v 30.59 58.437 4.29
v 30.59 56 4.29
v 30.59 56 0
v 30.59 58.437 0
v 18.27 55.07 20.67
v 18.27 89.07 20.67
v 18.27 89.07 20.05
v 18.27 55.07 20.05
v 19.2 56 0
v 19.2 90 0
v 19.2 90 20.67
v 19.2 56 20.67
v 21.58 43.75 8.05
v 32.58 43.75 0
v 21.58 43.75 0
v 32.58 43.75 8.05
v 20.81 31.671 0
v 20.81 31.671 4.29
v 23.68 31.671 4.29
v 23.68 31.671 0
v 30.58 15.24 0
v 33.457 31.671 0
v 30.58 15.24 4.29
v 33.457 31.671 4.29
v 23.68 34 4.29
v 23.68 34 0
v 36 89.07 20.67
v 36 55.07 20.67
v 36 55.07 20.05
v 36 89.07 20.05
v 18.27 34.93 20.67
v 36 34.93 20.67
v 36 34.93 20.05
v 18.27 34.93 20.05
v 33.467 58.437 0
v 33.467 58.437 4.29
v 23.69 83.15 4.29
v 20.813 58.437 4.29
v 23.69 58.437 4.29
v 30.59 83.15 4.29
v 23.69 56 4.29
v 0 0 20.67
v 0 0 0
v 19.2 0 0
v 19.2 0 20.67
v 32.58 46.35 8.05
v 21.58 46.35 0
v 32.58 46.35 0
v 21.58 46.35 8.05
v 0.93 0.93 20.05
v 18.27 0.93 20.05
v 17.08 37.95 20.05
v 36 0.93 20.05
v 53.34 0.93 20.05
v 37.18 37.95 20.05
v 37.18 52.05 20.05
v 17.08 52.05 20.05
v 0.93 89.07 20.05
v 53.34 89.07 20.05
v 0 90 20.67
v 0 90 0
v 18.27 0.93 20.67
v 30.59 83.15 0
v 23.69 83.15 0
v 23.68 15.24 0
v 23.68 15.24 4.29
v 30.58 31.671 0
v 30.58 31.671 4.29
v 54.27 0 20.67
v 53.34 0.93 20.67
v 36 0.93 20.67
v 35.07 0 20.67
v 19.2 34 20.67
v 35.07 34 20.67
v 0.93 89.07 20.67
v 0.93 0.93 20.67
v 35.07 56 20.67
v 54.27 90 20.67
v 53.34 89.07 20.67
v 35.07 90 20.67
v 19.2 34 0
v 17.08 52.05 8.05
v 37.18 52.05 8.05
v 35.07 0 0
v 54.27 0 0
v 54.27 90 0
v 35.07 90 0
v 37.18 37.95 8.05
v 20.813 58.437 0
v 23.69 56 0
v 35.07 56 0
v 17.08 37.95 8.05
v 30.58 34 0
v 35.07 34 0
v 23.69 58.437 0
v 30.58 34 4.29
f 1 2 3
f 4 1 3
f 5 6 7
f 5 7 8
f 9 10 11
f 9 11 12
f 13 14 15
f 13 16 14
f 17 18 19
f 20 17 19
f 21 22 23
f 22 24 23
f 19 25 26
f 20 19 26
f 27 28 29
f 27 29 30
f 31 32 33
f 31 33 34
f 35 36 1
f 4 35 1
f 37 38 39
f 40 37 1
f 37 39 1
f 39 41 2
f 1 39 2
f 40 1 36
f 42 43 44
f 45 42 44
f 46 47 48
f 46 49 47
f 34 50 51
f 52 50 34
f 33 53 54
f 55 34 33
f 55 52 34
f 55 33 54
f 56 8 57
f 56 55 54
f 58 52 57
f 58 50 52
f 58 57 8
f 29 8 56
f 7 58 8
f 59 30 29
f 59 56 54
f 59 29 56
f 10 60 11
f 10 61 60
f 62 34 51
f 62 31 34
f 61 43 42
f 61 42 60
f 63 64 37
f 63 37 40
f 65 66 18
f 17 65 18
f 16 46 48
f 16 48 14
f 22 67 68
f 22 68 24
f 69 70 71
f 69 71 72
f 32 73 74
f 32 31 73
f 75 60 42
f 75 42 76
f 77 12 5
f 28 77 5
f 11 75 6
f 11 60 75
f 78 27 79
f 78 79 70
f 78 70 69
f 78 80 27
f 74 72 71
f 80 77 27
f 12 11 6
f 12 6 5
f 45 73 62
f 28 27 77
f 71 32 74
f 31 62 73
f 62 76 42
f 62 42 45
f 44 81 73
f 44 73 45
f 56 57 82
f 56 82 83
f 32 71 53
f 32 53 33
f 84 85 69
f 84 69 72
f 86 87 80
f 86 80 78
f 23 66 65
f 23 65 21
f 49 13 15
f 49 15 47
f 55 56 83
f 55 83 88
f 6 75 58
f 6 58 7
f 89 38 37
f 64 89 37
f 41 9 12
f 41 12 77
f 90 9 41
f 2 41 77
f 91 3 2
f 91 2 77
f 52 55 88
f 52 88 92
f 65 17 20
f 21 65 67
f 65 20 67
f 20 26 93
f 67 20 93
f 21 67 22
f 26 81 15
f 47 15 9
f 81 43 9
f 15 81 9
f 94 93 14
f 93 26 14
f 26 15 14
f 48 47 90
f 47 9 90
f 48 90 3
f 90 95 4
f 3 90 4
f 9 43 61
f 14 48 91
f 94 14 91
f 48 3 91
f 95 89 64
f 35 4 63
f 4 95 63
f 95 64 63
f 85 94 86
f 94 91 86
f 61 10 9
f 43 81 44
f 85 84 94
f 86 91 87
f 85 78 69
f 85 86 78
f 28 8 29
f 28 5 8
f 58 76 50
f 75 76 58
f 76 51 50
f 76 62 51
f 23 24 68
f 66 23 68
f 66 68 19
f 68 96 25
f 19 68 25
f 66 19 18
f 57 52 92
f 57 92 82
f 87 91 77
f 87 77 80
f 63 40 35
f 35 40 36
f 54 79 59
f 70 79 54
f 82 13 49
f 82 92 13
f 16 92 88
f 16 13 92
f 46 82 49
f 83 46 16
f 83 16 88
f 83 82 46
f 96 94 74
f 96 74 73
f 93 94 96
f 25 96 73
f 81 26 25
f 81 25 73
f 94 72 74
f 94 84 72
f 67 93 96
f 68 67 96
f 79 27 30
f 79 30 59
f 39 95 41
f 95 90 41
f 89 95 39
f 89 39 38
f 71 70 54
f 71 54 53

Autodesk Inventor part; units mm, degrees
ref_plane "YZ Plane" through (0, 0, 0) normal (1, 0, 0) x (0, 1, 0)
ref_plane "XZ Plane" through (0, 0, 0) normal (0, 1, 0) x (-1, 0, 0)
ref_plane "XY Plane" through (0, 0, 0) normal (0, 0, 1) x (1, 0, 0)
sketch "Sketch1" plane through (0, 0, 0) normal (0, 0, 1) x (1, 0, 0)
  line L0 (0, 0) -> (0, 90)
  line L1 (0, 90) -> (19.2, 90)
  line L2 (19.2, 90) -> (19.2, 56)
  line L3 (19.2, 56) -> (35.07, 56)
  line L4 (35.07, 56) -> (35.07, 90)
  line L5 (35.07, 90) -> (54.27, 90)
  line L6 (54.27, 90) -> (54.27, 0)
  line L7 (54.27, 0) -> (35.07, 0)
  line L8 (35.07, 0) -> (35.07, 34)
  line L9 (35.07, 34) -> (19.2, 34)
  line L10 (19.2, 34) -> (19.2, 0)
  line L11 (0, 0) -> (19.2, 0)
  dimension "d0" = 90
  dimension "d1" = 19.2
  dimension "d2" = 34
  dimension "d3" = 15.87
  dimension "d4" = 19.2
  dimension "d5" = 34
  dimension "d37" = 22
extrude "Extrusion1" add sketch "Sketch1" along normal blind 20.67
sketch "Sketch2" plane through (19.2, 56, 0) normal (0, 1, 0) x (1, 0, 0)
  line L0 (15.87, 0) -> (0, 0) projected
  line L1 (11.39, 0) -> (4.49, 0)
  line L2 (4.49, 0) -> (4.49, -4.29)
  line L3 (4.49, -4.29) -> (11.39, -4.29)
  line L4 (11.39, -4.29) -> (11.39, 0)
  point P0 (-19.2, 0)
  dimension "d8" = 6.9
  dimension "d9" = 4.29
extrude "Extrusion2" add sketch "Sketch2" along normal blind 27.15
sketch "Sketch3" plane through (23.69, 56, 4.29) normal (0, 0, 1) x (1, 0, 0)
  line L0 (6.9, 0) -> (0, 0) projected
  line L1 (0, 27.15) -> (6.9, 27.15) projected
  line L2 (0, 0) -> (0, 27.15) projected
  line L3 (6.9, 27.15) -> (9.7769, 2.4369)
  line L4 (6.9, 27.15) -> (31.78, 27.15) construction
  line L5 (9.7769, 2.4369) -> (6.9, 2.4369)
  line L6 (6.9, 0) -> (6.9, 27.15) projected
  line L7 (0, 2.4369) -> (-2.877, 2.4369)
  line L8 (-2.877, 2.4369) -> (0, 27.15)
  point P0 (-23.69, -56)
  dimension "d12" = 24.88
  dimension "d13" = 83.36
  dimension "d14" = 2.877
extrude "Extrusion3" add sketch "Sketch3" against normal blind 4.29
sketch "Sketch4" plane through (19.2, 34, 0) normal (0, -1, 0) x (1, 0, 0)
  line L0 (0, 0) -> (0, 20.67) projected
  line L1 (0, 0) -> (4.49, 0) projected
  line L2 (4.48, 0) -> (11.38, 0)
  line L3 (11.38, 0) -> (11.38, 4.29)
  line L4 (11.38, 4.29) -> (4.48, 4.29)
  line L5 (4.48, 4.29) -> (4.48, 0)
  point P0 (-19.2, 0)
  dimension "d17" = 6.9
  dimension "d18" = 4.29
  dimension "d19" = 4.48
extrude "Extrusion4" add sketch "Sketch4" along normal blind 18.76
sketch "Sketch5" plane through (23.68, 34, 4.29) normal (0, 0, 1) x (1, 0, 0)
  line L0 (0, 0) -> (6.9, 0) projected
  line L1 (0, 0) -> (0, -18.76) projected
  line L2 (6.9, -18.76) -> (0, -18.76) projected
  line L3 (0, -18.76) -> (-2.87, -2.3288)
  line L4 (-4.48, -34) -> (-4.48, 0) projected
  line L5 (-2.87, -2.3288) -> (0, -2.3288)
  line L6 (6.9, 0) -> (6.9, -18.76) projected
  line L7 (6.9, -2.3288) -> (9.777, -2.3288)
  line L8 (9.777, -2.3288) -> (6.9, -18.76)
  point P0 (-23.68, -34)
  dimension "d22" = 16.68
  dimension "d23" = 1.61
  dimension "d24" = 2.877
extrude "Extrusion5" add sketch "Sketch5" against normal blind 4.29
sketch "Sketch6" plane through (0, 0, 20.67) normal (0, 0, 1) x (1, 0, 0)
  line L0 (0.93, 0.93) -> (0.93, 89.07)
  line L1 (0, 90) -> (19.2, 90) projected
  line L2 (0.93, 89.07) -> (18.27, 89.07)
  line L3 (18.27, 89.07) -> (18.27, 55.07)
  line L4 (18.27, 55.07) -> (36, 55.07)
  line L5 (36, 55.07) -> (36, 89.07)
  line L6 (36, 89.07) -> (53.34, 89.07)
  line L7 (53.34, 89.07) -> (53.34, 0.93)
  line L8 (53.34, 0.93) -> (36, 0.93)
  line L9 (36, 0.93) -> (36, 34.93)
  line L10 (36, 34.93) -> (18.27, 34.93)
  line L11 (18.27, 34.93) -> (18.27, 0.93)
  line L12 (18.27, 0.93) -> (0.93, 0.93)
  line L13 (35.07, 56) -> (19.2, 56) projected
  dimension "d27" = 88.14
  dimension "d28" = 17.34
  dimension "d29" = 34
  dimension "d30" = 17.73
  dimension "d31" = 34
  dimension "d32" = 17.34
  dimension "d33" = 88.14
  dimension "d34" = 34
  dimension "d38" = 0.93
  dimension "d39" = 0.93
extrude "Extrusion6" cut sketch "Sketch6" against normal blind 0.62
sketch "Sketch7" plane through (0, 0, 20.05) normal (0, 0, 1) x (1, 0, 0)
  line L0 (0.93, 0.93) -> (0.93, 89.07) projected
  line L1 (36, 34.93) -> (18.27, 34.93) projected
  line L2 (53.34, 89.07) -> (53.34, 0.93) projected
  line L3 (18.27, 55.07) -> (36, 55.07) projected
  line L4 (17.08, 52.05) -> (37.18, 52.05)
  line L5 (37.18, 52.05) -> (37.18, 37.95)
  line L6 (37.18, 37.95) -> (17.08, 37.95)
  line L7 (17.08, 37.95) -> (17.08, 52.05)
  point P0 (0, 0)
  dimension "d40" = 14.1
  dimension "d41" = 20.1
  dimension "d42" = 3.02
  dimension "d43" = 3.02
  dimension "d44" = 16.15
  dimension "d45" = 16.16
extrude "Extrusion7" cut sketch "Sketch7" against normal blind 12
sketch "Sketch8" plane through (0, 0, 8.05) normal (0, 0, 1) x (1, 0, 0)
  line L0 (17.08, 52.05) -> (37.18, 52.05) projected
  line L1 (17.08, 37.95) -> (17.08, 52.05) projected
  line L2 (21.58, 46.35) -> (32.58, 46.35)
  line L3 (32.58, 46.35) -> (32.58, 43.75)
  line L4 (32.58, 43.75) -> (21.58, 43.75)
  line L5 (21.58, 43.75) -> (21.58, 46.35)
  point P0 (0, 0)
  dimension "d48" = 11
  dimension "d49" = 2.6
  dimension "d50" = 5.7
  dimension "d51" = 4.5
extrude "Extrusion8" cut sketch "Sketch8" against normal up to next
properties part number "Gebouw Helix V1"
